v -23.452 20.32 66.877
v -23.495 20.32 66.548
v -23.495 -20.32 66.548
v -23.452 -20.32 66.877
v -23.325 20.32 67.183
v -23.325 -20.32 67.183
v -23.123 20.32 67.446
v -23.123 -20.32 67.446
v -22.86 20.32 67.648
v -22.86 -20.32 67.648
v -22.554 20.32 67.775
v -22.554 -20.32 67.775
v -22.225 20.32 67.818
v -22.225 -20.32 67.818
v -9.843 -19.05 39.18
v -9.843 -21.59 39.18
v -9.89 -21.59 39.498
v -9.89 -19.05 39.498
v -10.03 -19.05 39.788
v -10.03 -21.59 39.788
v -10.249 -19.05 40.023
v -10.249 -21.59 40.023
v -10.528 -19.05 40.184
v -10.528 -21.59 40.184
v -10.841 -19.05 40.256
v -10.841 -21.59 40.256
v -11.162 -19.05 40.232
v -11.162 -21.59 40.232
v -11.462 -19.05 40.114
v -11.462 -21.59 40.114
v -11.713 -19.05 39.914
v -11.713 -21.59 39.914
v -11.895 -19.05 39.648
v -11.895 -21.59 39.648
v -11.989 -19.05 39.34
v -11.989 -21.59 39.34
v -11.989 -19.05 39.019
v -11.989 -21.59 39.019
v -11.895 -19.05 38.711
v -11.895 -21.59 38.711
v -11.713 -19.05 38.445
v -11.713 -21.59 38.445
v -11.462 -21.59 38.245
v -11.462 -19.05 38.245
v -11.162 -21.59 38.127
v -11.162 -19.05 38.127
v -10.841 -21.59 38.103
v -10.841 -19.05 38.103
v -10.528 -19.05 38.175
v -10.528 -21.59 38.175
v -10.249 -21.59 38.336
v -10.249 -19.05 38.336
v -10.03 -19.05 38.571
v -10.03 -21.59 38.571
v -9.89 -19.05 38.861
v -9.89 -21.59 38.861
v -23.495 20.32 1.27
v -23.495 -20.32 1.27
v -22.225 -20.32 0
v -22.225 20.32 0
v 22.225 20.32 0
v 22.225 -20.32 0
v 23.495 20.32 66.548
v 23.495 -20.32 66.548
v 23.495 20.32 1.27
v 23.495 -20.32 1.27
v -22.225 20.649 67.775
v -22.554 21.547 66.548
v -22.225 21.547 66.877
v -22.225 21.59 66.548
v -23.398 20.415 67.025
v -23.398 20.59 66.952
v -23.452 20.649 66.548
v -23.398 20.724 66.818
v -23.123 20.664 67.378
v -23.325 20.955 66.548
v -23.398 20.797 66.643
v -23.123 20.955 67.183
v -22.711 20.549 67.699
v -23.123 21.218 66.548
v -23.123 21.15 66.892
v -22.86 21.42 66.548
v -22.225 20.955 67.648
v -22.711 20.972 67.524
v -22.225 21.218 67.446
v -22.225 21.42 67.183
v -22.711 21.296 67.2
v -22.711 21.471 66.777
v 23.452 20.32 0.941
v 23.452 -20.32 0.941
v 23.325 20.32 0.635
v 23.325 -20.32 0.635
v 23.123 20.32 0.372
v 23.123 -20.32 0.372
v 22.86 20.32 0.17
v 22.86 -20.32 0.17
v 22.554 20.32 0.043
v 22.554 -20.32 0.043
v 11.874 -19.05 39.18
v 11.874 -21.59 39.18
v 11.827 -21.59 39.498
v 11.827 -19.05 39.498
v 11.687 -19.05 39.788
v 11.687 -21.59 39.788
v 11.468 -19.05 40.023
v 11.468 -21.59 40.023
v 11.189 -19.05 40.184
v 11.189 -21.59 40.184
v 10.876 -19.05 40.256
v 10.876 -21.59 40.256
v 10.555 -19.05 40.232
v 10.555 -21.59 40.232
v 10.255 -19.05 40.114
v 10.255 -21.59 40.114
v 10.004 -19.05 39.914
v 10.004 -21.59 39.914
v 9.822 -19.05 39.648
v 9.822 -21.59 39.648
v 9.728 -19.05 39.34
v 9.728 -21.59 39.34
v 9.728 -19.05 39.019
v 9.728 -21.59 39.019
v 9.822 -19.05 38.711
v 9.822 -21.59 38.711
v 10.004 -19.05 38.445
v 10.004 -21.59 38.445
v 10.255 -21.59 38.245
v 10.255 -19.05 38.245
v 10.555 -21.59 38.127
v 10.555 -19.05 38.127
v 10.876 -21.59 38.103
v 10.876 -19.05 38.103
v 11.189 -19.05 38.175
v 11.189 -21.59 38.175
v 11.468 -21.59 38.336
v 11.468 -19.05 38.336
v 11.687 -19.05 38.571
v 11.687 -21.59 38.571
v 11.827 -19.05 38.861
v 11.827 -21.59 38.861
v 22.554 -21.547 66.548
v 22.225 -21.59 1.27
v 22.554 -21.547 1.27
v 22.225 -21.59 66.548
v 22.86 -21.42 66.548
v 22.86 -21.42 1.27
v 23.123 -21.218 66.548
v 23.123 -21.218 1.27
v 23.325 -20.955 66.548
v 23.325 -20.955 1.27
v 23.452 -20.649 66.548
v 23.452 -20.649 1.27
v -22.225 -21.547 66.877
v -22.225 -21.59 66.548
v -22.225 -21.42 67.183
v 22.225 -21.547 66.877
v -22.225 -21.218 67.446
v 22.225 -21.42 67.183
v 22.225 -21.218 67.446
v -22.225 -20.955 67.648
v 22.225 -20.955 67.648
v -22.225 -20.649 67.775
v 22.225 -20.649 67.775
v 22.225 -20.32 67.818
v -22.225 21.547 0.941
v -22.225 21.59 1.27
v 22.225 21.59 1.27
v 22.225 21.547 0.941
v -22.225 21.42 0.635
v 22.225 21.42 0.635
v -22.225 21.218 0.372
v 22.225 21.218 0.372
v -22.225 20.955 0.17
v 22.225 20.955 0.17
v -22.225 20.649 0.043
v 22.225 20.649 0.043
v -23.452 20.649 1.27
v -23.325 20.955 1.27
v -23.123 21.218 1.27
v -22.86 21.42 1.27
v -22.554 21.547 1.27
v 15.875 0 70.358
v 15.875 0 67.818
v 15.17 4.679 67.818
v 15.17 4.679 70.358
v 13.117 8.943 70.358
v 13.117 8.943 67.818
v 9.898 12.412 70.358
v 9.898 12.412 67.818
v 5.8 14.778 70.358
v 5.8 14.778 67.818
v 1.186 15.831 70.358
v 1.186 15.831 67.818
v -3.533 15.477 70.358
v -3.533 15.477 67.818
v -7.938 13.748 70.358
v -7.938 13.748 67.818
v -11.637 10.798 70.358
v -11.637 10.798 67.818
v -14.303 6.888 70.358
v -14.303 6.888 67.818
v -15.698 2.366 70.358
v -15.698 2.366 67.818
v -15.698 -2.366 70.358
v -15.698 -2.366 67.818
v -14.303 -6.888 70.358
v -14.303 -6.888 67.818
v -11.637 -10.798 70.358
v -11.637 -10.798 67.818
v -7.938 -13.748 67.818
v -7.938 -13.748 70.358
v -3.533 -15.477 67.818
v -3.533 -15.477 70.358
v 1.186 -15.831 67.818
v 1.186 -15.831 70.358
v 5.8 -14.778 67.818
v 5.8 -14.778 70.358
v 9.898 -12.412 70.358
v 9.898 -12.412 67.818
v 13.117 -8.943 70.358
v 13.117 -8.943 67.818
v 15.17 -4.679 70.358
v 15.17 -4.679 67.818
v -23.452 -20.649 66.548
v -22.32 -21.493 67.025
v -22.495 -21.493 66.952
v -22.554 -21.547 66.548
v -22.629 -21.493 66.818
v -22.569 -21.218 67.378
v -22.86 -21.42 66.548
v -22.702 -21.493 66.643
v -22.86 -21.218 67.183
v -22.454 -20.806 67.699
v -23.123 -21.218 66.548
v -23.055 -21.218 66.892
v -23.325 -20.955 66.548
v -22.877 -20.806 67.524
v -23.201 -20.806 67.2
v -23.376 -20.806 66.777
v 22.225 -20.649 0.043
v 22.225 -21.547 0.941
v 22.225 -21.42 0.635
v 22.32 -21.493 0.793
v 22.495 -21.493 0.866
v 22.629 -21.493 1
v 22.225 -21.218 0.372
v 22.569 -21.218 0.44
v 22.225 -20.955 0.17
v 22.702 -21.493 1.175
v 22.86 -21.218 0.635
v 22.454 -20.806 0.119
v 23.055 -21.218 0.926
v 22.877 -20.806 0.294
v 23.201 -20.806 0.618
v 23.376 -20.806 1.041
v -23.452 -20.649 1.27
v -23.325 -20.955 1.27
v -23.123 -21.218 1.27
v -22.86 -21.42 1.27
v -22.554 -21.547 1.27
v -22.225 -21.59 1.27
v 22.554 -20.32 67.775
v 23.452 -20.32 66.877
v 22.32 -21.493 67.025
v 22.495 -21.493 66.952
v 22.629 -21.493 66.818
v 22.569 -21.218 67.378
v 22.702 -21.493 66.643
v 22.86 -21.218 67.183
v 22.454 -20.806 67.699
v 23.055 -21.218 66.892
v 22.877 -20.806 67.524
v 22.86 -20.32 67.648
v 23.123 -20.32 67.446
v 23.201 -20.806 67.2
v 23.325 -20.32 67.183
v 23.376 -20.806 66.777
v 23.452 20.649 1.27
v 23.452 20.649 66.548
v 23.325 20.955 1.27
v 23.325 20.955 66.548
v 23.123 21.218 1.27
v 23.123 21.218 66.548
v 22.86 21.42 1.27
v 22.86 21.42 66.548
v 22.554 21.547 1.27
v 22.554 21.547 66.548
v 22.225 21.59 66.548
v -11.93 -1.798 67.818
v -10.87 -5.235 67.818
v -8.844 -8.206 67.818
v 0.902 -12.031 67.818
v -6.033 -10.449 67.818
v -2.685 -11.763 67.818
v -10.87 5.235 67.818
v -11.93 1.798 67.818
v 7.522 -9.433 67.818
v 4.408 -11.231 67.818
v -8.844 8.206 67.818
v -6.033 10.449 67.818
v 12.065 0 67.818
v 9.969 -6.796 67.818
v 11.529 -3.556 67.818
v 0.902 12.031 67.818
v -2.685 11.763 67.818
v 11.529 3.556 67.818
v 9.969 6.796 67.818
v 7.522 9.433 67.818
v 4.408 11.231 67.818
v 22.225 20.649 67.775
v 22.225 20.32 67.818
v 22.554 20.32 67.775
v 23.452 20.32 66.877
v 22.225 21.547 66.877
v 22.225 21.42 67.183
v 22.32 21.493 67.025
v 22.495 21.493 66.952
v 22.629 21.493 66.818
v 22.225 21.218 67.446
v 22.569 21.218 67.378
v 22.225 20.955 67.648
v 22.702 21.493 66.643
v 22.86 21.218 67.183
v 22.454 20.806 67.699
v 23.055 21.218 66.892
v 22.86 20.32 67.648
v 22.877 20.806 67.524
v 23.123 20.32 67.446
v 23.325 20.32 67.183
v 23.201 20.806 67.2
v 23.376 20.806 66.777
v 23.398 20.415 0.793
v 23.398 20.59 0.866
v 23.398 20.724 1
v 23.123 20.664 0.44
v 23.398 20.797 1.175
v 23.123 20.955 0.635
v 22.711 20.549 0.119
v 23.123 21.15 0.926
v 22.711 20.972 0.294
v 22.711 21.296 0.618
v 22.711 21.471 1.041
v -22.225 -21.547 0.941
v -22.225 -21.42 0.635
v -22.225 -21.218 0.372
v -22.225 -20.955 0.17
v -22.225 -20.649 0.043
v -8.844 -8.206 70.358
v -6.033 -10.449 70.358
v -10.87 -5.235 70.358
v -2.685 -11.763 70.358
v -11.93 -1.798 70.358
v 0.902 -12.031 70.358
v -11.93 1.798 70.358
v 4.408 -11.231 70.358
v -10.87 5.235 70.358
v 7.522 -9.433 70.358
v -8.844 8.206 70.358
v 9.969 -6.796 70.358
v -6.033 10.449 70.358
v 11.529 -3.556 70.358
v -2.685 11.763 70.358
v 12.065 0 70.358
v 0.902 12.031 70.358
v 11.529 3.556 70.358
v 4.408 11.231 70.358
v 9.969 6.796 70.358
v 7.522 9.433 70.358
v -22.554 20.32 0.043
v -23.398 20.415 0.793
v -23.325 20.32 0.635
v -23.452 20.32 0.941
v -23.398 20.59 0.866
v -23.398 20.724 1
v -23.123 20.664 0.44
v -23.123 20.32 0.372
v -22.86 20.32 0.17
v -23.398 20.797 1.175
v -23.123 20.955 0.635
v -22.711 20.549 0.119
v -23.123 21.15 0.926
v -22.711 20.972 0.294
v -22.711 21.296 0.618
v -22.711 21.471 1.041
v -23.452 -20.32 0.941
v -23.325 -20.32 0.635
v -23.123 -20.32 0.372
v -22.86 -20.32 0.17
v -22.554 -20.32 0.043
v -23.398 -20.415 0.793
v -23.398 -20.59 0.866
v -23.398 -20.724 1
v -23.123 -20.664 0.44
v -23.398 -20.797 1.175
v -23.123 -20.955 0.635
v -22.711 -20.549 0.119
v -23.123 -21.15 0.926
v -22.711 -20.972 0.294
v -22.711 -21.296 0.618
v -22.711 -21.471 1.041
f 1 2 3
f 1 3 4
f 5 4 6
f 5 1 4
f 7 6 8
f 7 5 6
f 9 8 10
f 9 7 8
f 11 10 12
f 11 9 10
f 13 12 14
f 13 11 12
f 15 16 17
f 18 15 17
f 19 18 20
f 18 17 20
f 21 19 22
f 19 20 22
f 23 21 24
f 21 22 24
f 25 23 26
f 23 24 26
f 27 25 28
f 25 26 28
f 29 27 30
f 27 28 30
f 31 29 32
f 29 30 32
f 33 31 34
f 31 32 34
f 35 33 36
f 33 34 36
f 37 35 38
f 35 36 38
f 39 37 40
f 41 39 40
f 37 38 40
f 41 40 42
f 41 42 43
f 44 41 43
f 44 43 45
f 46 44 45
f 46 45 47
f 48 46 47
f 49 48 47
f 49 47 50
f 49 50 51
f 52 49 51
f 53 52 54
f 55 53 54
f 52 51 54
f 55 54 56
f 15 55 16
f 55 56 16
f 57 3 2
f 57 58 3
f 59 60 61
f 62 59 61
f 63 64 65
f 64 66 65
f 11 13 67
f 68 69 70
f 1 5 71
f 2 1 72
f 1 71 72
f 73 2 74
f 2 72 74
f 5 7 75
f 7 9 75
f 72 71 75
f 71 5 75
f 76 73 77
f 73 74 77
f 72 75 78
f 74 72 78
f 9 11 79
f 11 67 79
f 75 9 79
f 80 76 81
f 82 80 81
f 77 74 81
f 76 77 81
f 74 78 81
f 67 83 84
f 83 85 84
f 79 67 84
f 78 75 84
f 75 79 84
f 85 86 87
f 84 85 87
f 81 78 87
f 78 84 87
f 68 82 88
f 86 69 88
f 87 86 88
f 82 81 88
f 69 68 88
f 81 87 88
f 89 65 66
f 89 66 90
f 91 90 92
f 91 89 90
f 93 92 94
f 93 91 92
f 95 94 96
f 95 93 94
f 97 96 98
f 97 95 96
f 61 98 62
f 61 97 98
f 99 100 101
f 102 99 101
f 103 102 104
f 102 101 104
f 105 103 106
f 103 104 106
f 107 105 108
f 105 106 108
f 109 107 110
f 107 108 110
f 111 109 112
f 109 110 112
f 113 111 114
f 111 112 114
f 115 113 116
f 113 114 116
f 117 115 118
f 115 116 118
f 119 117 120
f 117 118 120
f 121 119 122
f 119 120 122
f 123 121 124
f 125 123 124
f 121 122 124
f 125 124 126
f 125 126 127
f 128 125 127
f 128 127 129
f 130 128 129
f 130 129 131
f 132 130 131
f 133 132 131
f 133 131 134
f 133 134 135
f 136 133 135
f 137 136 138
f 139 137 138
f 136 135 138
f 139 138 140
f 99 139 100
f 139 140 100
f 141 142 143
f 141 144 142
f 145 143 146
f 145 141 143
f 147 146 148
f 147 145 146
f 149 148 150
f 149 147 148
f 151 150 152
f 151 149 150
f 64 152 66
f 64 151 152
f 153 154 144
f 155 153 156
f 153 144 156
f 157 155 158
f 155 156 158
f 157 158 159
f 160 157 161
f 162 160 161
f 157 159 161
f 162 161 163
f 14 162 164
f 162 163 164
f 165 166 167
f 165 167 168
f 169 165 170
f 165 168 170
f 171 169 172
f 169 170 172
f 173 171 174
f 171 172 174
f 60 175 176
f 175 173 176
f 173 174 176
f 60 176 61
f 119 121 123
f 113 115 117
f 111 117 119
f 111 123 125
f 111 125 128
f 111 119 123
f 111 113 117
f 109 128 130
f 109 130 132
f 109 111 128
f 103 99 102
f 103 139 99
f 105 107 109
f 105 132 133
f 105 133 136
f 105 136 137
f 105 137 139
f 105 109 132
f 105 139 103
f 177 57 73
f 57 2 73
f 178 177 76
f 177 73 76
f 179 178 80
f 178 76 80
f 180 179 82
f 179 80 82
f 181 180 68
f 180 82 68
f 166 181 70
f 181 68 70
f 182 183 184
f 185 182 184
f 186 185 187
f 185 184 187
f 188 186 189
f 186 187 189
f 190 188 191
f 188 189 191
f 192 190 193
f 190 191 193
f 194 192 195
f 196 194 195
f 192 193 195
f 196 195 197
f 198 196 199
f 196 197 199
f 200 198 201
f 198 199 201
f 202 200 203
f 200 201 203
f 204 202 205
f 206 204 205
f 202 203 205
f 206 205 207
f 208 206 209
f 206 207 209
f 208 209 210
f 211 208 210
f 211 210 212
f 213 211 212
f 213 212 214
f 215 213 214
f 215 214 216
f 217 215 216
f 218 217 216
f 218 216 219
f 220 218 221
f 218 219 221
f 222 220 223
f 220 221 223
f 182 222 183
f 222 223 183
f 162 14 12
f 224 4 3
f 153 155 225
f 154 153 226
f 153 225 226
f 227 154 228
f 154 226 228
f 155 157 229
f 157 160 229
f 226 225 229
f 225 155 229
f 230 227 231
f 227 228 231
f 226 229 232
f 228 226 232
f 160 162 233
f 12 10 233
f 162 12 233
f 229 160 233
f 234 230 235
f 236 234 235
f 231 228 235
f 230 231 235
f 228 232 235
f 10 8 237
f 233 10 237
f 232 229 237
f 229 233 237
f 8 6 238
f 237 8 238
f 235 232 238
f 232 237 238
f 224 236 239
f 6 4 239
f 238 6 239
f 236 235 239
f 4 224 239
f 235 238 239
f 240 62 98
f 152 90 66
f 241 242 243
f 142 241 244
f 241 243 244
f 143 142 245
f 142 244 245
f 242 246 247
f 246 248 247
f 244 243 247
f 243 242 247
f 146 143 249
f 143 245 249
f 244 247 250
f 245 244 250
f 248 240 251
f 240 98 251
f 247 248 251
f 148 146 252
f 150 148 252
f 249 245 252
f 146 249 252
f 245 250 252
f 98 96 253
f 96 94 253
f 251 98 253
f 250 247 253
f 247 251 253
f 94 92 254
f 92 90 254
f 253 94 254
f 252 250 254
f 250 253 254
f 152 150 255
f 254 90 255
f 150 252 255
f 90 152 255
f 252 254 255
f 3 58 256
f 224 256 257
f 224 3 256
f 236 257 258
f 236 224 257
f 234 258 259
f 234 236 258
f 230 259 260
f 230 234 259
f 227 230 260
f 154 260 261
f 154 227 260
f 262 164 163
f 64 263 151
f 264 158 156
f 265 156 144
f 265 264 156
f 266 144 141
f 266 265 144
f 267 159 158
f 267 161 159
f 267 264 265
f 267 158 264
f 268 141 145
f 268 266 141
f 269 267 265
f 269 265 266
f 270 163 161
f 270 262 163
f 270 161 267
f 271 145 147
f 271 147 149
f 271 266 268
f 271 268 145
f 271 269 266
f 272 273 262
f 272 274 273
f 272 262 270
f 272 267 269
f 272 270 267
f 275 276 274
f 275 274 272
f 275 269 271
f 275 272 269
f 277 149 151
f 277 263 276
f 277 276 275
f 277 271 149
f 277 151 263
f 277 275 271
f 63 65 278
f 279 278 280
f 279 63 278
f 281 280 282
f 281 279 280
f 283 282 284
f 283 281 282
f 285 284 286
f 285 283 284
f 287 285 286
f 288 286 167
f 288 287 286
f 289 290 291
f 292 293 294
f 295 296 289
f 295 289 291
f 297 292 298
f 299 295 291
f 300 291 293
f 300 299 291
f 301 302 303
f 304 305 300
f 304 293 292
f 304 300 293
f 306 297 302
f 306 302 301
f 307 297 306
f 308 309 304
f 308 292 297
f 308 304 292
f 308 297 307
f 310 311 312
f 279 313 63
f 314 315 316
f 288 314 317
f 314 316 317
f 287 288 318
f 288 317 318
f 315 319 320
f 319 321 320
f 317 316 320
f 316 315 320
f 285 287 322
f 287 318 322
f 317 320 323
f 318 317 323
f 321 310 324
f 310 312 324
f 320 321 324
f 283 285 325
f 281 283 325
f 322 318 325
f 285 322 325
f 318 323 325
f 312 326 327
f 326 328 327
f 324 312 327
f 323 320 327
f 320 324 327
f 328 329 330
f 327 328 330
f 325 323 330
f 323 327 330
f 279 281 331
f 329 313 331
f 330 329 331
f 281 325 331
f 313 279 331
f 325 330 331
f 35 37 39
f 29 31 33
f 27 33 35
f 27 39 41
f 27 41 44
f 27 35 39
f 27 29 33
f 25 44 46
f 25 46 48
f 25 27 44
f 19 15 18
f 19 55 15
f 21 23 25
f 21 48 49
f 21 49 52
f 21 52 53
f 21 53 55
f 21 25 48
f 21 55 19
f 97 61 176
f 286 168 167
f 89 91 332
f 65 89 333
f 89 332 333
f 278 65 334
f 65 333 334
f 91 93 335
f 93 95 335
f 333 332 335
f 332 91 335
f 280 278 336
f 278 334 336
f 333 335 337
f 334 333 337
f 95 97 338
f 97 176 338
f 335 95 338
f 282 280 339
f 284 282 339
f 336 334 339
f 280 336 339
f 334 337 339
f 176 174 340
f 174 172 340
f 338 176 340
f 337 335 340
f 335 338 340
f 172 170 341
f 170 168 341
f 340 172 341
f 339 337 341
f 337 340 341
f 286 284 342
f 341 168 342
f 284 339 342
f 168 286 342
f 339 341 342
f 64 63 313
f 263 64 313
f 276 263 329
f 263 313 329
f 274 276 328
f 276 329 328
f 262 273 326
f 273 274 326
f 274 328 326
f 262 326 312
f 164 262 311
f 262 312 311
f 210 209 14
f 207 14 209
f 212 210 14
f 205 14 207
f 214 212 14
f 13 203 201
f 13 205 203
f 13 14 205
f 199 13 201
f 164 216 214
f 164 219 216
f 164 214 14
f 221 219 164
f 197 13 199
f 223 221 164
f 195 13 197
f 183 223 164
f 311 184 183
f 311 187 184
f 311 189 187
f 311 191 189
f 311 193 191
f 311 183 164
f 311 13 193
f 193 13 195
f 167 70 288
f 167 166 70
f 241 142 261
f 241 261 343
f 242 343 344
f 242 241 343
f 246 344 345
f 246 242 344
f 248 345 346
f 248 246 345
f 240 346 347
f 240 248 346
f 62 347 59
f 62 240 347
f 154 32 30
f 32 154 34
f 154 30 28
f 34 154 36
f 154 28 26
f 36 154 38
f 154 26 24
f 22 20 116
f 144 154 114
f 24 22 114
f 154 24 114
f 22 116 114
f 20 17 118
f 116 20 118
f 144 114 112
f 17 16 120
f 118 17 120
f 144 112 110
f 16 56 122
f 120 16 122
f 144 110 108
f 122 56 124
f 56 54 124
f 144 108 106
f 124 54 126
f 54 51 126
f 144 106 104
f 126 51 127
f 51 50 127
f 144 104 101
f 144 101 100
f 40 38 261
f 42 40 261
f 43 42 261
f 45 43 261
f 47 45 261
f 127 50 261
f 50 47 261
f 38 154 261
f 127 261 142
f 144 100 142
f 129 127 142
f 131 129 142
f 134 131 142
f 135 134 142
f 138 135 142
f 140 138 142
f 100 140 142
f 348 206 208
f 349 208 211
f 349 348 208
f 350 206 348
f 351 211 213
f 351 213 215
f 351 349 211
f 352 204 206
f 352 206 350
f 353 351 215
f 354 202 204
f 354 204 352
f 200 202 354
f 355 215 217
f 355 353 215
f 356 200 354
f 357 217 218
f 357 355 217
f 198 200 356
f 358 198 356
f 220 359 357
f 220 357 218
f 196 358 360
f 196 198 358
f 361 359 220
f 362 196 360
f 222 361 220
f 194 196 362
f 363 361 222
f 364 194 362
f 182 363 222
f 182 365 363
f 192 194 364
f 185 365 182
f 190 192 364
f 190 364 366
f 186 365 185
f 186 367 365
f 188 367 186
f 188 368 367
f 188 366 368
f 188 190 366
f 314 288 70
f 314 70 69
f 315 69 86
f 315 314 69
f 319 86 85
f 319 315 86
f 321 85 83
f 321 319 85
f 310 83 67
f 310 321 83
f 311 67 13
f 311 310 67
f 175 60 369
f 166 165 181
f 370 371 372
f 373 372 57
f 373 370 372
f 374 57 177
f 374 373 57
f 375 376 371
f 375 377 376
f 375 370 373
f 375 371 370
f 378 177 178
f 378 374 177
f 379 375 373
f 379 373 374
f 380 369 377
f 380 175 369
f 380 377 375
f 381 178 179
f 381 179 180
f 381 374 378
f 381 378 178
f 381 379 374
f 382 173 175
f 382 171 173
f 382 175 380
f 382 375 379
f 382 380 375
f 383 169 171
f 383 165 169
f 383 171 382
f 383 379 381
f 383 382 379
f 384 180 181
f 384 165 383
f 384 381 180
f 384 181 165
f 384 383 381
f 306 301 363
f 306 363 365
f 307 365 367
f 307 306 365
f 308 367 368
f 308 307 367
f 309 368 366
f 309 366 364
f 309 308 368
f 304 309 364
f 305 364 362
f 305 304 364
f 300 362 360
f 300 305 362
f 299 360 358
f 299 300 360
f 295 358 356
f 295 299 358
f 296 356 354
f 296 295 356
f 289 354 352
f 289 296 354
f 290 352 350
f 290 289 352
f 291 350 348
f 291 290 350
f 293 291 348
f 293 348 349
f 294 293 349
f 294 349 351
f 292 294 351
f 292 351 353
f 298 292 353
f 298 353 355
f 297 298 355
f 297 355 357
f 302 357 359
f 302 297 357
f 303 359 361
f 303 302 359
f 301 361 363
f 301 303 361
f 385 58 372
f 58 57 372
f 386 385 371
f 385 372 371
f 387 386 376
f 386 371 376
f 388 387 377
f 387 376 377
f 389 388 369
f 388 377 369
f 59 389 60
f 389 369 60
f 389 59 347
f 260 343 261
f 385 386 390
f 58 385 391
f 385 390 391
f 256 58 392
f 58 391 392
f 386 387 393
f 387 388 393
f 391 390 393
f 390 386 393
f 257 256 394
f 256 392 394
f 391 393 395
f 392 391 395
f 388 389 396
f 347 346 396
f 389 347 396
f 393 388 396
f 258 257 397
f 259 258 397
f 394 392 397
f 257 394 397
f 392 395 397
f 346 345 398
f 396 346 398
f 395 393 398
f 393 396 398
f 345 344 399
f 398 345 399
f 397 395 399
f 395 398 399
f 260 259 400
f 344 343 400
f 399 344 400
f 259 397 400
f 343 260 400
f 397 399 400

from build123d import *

# Parameters (mm, degrees)
SKETCH1_W          = 46.99
SKETCH1_H          = 43.18
EXTRUDE1_DEPTH     = 67.818
FILLET2_R          = 1.27
SKETCH2_R          = 15.875
SKETCH2_R_2        = 12.065
EXTRUDE2_DEPTH     = 2.54
SKETCH3_R          = 1.0795
CUT_EXTRUDE1_DEPTH = 2.54


with BuildPart() as part:
    # Sketch1 → Extrude1 (new body)
    with BuildSketch(Plane.XY):
        Rectangle(SKETCH1_W, SKETCH1_H)
    extrude(amount=EXTRUDE1_DEPTH)

    # Fillet2
    fillet2_edges = [part.edges().sort_by_distance(p)[0] for p in [
        (23.495, 0, 67.818),
        (0, 21.59, 67.818),
        (-23.495, 0, 67.818),
        (0, 21.59, 0),
        (23.495, 0, 0),
        (0, -21.59, 0),
        (-23.495, 0, 0),
        (0, -21.59, 67.818),
        (-23.495, 21.59, 33.909),
        (23.495, 21.59, 33.909),
        (23.495, -21.59, 33.909),
        (-23.495, -21.59, 33.909),
    ]]
    fillet(fillet2_edges, radius=FILLET2_R)

    # Sketch2 → Extrude2 (add)
    with BuildSketch(Plane.XY.offset(67.818)):
        Circle(SKETCH2_R)
        Circle(SKETCH2_R_2, mode=Mode.SUBTRACT)
    extrude(amount=EXTRUDE2_DEPTH)

    # Sketch3 → Cut-Extrude1 (cut)
    with BuildSketch(Plane.XZ.offset(21.59)):
        with Locations((-10.922, 39.1795)):
            Circle(SKETCH3_R)
        with Locations((10.795, 39.1795)):
            Circle(SKETCH3_R)
    extrude(amount=-CUT_EXTRUDE1_DEPTH, mode=Mode.SUBTRACT)


solid = part.part
